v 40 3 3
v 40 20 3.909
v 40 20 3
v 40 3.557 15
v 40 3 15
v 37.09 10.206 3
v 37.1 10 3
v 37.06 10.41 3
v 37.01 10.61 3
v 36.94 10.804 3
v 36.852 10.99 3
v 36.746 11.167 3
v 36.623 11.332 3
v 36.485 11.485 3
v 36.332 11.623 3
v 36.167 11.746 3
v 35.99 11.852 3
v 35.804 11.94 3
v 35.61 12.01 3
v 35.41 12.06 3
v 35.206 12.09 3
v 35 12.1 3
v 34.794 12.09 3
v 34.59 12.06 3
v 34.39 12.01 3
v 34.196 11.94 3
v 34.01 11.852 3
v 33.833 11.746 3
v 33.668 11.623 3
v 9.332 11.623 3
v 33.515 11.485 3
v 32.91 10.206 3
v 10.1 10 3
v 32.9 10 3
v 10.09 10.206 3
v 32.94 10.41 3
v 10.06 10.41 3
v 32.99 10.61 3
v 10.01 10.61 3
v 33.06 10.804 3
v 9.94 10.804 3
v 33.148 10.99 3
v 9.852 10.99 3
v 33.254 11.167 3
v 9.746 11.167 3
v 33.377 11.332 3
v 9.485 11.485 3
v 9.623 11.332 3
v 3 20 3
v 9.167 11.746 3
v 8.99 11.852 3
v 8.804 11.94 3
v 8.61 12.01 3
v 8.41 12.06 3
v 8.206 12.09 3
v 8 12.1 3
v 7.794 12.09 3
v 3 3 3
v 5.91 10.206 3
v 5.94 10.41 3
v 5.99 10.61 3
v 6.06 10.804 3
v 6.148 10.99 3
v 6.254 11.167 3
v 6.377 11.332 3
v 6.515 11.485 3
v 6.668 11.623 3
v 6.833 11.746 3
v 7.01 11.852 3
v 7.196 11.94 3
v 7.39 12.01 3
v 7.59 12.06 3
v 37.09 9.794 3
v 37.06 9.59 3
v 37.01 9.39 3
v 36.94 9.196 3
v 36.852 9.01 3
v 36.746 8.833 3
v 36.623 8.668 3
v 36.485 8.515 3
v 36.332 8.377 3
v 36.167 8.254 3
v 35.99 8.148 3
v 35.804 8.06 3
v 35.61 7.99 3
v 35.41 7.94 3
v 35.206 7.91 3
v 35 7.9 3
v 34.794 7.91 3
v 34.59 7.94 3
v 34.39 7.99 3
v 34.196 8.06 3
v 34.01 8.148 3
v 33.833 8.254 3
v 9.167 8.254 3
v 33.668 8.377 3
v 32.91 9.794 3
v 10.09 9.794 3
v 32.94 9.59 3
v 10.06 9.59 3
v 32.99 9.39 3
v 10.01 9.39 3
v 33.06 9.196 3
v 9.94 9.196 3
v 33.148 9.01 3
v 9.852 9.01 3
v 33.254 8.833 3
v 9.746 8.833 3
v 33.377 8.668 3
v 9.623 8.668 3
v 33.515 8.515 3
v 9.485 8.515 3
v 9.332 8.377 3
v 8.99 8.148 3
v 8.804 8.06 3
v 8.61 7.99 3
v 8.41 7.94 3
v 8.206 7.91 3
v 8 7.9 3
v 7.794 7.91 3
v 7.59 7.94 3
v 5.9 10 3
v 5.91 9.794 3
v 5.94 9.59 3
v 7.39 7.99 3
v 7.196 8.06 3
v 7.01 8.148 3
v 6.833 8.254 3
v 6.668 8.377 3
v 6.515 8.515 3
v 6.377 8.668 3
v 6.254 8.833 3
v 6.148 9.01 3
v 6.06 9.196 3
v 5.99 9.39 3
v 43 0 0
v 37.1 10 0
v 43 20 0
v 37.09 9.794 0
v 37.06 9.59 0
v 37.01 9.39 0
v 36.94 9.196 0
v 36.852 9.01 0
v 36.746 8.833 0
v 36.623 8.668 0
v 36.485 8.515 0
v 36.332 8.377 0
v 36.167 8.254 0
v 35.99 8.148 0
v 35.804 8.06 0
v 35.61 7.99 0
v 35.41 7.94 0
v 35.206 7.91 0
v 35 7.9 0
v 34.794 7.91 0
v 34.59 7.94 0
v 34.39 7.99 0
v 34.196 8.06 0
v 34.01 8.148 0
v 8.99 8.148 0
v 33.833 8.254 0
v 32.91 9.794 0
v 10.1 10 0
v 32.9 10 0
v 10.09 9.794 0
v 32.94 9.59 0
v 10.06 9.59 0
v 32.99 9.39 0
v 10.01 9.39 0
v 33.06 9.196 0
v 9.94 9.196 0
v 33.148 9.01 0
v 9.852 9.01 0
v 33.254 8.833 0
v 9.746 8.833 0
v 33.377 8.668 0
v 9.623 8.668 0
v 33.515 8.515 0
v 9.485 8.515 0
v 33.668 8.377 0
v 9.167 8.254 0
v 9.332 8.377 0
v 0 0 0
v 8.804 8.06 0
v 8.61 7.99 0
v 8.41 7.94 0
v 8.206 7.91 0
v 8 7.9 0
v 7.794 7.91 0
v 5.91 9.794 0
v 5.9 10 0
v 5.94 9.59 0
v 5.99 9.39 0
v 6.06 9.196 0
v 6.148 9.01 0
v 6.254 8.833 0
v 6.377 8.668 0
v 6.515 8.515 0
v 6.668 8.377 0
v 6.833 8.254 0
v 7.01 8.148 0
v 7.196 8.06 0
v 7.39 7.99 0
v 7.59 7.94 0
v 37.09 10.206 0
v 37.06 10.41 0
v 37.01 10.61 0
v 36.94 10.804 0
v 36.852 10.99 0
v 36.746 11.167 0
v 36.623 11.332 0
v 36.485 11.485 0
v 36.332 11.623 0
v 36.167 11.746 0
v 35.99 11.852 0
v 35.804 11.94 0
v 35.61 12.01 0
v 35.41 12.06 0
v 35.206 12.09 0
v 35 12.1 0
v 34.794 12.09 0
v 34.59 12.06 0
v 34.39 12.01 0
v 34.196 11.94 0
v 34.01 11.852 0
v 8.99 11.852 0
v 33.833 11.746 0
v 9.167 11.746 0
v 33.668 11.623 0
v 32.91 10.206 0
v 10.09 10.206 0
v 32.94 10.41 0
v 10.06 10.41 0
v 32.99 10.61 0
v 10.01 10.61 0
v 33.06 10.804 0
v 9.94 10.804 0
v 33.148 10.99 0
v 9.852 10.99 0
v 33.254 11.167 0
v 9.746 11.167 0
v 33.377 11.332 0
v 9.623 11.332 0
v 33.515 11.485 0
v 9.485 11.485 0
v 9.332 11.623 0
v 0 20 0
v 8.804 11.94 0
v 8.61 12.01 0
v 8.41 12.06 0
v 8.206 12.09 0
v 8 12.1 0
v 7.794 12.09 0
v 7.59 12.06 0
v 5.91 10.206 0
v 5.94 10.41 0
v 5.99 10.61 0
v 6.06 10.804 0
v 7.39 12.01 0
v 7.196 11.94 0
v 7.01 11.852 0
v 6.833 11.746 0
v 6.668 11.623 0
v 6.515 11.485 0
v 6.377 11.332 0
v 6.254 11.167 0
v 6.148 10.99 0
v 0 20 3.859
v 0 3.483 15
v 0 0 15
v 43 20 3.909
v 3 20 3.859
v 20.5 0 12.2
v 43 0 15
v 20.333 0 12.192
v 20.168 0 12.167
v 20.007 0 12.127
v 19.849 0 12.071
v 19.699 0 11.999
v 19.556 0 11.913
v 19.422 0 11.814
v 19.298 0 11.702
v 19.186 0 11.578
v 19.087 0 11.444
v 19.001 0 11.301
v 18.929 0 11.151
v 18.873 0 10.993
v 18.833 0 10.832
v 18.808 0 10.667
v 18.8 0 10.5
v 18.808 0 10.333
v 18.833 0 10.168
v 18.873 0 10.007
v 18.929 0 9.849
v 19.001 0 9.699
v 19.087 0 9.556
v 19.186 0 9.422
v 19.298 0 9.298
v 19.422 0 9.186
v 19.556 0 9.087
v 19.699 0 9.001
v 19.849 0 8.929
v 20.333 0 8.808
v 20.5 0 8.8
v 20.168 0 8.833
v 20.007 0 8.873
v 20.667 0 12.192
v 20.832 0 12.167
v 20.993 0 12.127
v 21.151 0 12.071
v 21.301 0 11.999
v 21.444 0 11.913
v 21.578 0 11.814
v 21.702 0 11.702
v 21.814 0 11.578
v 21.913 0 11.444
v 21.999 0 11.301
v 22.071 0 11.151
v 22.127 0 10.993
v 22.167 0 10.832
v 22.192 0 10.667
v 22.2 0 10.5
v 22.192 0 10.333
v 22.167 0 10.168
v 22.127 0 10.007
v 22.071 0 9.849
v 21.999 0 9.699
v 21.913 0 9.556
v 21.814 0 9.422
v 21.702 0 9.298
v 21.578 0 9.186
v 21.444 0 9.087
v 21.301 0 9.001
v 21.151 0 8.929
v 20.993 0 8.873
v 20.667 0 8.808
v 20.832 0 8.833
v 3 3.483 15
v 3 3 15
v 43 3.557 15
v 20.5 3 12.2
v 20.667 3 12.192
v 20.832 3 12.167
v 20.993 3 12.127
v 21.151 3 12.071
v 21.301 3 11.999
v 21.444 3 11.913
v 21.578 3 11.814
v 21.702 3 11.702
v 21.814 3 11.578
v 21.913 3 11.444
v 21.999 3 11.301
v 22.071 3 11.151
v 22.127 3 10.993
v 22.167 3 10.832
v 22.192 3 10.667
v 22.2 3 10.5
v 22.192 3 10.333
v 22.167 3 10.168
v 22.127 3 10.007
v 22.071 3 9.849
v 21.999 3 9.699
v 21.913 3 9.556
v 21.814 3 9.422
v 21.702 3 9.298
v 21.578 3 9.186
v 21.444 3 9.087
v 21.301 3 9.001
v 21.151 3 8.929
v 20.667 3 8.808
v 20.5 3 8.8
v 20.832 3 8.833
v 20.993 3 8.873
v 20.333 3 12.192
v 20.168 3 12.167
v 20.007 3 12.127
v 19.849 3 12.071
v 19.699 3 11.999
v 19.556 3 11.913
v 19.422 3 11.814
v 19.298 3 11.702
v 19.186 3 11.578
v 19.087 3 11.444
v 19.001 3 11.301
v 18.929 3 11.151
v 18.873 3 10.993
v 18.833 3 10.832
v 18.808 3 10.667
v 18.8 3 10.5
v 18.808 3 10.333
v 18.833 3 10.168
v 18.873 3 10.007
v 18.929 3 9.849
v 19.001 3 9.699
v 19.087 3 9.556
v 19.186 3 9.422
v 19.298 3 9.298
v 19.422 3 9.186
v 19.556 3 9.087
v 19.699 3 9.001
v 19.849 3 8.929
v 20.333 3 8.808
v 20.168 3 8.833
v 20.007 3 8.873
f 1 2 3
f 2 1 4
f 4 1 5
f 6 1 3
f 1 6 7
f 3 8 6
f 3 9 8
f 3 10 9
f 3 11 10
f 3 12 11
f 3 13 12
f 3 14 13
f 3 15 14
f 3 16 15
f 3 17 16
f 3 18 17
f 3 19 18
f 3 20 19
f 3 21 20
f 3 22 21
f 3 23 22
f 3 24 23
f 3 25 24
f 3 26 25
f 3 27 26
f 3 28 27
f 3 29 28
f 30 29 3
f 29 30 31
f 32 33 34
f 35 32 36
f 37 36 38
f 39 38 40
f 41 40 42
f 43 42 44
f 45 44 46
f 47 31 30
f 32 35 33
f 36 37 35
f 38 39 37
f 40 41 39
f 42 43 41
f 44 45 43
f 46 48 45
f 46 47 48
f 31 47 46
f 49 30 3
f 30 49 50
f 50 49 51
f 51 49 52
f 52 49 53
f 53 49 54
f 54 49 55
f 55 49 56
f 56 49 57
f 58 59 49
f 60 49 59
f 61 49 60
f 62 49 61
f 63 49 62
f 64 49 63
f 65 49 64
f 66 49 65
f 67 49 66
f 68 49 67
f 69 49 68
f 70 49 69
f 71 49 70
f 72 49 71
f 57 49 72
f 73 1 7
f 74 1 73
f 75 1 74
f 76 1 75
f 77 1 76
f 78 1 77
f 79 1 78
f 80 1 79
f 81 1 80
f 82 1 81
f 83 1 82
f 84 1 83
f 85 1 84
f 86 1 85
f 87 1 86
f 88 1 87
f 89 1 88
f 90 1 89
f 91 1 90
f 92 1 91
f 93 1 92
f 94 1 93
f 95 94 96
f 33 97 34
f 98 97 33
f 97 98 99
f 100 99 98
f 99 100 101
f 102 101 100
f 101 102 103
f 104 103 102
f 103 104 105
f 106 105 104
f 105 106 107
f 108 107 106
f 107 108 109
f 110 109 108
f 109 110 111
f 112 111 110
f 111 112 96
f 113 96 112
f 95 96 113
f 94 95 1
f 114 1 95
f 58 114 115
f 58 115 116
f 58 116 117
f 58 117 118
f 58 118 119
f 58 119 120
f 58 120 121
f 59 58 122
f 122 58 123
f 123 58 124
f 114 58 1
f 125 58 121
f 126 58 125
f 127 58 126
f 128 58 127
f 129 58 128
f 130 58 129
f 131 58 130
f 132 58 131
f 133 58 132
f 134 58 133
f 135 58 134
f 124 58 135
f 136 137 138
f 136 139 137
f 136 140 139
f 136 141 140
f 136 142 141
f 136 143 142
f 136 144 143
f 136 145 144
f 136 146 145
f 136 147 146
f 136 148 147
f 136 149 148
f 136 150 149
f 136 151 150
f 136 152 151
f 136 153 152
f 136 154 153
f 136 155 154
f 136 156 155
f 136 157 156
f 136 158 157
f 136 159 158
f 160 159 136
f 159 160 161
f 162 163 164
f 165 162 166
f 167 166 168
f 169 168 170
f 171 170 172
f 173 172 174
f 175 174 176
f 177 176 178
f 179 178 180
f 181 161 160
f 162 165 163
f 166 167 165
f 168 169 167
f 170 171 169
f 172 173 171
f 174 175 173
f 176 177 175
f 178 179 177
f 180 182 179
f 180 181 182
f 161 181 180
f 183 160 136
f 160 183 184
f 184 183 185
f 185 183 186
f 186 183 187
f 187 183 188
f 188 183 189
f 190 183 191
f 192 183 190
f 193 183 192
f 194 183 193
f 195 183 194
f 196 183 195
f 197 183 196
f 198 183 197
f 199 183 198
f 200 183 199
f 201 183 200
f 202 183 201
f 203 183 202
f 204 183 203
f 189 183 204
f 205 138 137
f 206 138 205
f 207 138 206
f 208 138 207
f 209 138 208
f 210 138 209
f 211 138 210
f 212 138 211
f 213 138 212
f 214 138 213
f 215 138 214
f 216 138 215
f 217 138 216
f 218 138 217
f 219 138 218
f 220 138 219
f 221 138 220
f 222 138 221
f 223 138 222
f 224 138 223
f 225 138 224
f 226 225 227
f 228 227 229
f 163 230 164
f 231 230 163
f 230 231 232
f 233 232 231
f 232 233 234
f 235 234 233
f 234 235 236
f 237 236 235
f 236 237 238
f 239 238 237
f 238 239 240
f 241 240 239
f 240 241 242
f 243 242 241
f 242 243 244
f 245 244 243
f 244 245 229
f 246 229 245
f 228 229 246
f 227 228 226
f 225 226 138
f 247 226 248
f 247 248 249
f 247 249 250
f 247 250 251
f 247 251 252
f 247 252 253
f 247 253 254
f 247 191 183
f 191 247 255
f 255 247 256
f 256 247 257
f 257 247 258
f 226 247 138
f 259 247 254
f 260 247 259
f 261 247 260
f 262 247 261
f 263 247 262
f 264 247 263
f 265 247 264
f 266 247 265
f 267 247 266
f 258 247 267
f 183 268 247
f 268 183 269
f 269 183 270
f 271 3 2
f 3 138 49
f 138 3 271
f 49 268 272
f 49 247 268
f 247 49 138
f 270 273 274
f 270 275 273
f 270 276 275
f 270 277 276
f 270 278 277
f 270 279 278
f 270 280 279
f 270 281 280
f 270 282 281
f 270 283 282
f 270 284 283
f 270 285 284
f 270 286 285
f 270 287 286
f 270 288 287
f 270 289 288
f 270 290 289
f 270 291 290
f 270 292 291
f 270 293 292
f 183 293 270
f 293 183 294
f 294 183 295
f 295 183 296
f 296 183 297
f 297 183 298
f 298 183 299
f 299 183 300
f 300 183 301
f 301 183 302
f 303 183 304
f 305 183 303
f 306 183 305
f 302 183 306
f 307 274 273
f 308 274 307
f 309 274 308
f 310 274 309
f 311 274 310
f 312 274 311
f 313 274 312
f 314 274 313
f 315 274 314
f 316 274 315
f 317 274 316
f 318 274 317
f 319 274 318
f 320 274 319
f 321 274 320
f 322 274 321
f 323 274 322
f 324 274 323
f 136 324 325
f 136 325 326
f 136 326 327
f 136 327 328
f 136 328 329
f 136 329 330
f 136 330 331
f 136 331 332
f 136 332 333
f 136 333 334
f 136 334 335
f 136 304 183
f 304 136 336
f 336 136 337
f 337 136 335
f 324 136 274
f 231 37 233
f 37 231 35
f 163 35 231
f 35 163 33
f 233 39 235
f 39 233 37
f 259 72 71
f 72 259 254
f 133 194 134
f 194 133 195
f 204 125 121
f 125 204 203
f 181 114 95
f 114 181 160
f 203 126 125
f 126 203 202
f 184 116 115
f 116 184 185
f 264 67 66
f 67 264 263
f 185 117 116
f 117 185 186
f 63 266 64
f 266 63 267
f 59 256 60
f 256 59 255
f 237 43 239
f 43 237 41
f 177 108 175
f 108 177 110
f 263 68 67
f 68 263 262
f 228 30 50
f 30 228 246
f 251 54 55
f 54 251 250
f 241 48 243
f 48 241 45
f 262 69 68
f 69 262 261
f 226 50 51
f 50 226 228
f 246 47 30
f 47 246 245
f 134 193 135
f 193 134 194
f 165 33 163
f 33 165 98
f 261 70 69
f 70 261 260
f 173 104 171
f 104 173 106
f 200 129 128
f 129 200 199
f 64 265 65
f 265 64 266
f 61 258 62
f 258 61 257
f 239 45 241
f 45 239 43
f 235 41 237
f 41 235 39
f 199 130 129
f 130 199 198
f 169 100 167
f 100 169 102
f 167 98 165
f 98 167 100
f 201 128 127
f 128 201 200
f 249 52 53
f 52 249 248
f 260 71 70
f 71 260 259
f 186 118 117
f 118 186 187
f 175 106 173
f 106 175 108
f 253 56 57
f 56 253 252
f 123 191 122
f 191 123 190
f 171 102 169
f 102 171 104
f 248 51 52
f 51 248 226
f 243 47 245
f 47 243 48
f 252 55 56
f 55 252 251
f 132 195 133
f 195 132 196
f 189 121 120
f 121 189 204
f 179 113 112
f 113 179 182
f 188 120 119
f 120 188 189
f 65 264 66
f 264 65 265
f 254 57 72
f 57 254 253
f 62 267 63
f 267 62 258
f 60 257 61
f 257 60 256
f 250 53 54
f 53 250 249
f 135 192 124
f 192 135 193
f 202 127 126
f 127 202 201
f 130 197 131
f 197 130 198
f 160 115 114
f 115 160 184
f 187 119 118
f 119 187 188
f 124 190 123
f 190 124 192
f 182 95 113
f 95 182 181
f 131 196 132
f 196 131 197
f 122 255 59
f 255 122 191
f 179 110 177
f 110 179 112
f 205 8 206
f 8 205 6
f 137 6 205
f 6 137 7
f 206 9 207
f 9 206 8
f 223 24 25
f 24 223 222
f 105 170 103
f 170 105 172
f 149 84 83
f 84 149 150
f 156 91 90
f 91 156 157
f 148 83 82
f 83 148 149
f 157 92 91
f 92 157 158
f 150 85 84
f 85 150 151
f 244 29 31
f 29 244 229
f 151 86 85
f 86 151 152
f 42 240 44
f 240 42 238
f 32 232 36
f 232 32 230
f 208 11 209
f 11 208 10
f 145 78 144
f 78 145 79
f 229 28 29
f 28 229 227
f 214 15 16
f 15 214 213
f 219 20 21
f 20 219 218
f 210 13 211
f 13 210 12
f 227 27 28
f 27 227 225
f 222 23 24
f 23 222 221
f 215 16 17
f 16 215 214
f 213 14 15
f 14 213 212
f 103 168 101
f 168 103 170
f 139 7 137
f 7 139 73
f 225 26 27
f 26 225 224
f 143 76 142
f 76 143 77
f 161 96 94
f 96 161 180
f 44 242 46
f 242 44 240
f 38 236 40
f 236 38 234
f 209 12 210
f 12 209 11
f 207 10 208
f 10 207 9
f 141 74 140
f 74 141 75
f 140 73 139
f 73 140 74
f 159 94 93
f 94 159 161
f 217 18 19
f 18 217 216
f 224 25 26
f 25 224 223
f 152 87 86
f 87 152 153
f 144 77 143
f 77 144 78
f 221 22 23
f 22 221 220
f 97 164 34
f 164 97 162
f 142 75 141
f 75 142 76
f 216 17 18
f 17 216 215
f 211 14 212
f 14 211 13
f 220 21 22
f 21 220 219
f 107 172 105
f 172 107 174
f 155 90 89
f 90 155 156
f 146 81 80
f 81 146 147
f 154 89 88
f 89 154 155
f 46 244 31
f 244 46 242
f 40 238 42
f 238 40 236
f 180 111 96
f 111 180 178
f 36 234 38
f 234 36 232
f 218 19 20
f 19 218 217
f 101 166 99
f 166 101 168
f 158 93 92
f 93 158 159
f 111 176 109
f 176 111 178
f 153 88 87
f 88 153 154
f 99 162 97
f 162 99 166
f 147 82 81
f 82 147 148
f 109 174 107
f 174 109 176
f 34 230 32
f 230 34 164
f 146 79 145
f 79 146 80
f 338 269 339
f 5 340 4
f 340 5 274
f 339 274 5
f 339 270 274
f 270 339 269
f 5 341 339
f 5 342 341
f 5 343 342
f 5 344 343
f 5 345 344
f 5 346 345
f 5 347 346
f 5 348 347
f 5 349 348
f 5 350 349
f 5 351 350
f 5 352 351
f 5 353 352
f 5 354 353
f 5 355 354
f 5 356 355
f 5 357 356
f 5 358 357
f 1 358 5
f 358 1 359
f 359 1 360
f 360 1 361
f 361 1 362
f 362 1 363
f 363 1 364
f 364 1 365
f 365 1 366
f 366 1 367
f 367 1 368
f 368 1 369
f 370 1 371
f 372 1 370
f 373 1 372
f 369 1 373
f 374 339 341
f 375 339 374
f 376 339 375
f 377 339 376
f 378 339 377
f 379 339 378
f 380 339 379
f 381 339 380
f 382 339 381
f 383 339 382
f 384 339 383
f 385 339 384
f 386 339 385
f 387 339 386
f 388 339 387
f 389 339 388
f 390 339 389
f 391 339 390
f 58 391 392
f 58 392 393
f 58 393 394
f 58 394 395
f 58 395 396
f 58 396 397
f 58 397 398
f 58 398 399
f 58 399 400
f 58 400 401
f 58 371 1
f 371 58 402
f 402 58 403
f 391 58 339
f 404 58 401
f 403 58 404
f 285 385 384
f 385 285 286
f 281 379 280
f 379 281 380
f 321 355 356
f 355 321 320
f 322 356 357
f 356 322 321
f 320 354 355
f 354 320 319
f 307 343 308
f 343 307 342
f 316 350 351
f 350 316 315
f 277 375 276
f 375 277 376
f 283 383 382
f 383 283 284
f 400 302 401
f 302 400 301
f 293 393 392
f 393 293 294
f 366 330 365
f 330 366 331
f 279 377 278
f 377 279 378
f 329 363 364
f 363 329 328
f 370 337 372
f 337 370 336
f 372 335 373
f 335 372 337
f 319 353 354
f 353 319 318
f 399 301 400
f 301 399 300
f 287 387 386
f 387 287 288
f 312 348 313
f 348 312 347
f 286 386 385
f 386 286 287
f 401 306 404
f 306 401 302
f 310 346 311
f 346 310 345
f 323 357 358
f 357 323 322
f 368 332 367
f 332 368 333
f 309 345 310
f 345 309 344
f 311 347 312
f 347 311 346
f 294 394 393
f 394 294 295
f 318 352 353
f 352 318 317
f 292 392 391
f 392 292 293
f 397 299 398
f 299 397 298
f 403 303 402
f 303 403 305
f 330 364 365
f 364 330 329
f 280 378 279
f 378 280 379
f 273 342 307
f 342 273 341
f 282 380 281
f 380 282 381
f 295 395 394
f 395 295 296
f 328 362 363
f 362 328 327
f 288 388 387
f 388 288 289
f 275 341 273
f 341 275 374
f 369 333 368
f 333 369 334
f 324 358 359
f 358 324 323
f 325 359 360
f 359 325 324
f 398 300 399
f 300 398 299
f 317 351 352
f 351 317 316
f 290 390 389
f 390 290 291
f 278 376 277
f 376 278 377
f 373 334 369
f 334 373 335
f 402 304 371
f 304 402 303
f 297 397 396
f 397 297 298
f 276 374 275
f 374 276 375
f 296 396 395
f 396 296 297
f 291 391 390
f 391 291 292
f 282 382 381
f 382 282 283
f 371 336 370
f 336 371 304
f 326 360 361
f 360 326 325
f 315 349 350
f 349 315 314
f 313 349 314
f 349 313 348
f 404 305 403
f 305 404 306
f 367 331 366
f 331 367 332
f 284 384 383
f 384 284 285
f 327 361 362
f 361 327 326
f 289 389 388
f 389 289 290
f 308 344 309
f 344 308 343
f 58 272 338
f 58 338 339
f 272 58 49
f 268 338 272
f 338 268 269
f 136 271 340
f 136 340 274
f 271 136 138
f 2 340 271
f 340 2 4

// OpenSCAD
$fn=64;
difference(){
cube([40,20,3]);
translate([8,10,-1])
cylinder(d=4.2,h=5);
translate([35,10,-1])
cylinder(d=4.2,h=5);
}
difference(){
cube([40,3,15]);
translate([20.5,4,10.5])
rotate([90,0,0])
cylinder(d=3.4,h=5);
}
difference(){
cube([3,20,15]);
translate([-1,2,16])
rotate(a=34, v=[-1,0,0])
cube([5,25,20]);
}


difference(){
translate([40,0,0])
cube([3,20,15]);
translate([39,2,16.05])
rotate(a=34, v=[-1,0,0])
cube([5,25,20]);
}
